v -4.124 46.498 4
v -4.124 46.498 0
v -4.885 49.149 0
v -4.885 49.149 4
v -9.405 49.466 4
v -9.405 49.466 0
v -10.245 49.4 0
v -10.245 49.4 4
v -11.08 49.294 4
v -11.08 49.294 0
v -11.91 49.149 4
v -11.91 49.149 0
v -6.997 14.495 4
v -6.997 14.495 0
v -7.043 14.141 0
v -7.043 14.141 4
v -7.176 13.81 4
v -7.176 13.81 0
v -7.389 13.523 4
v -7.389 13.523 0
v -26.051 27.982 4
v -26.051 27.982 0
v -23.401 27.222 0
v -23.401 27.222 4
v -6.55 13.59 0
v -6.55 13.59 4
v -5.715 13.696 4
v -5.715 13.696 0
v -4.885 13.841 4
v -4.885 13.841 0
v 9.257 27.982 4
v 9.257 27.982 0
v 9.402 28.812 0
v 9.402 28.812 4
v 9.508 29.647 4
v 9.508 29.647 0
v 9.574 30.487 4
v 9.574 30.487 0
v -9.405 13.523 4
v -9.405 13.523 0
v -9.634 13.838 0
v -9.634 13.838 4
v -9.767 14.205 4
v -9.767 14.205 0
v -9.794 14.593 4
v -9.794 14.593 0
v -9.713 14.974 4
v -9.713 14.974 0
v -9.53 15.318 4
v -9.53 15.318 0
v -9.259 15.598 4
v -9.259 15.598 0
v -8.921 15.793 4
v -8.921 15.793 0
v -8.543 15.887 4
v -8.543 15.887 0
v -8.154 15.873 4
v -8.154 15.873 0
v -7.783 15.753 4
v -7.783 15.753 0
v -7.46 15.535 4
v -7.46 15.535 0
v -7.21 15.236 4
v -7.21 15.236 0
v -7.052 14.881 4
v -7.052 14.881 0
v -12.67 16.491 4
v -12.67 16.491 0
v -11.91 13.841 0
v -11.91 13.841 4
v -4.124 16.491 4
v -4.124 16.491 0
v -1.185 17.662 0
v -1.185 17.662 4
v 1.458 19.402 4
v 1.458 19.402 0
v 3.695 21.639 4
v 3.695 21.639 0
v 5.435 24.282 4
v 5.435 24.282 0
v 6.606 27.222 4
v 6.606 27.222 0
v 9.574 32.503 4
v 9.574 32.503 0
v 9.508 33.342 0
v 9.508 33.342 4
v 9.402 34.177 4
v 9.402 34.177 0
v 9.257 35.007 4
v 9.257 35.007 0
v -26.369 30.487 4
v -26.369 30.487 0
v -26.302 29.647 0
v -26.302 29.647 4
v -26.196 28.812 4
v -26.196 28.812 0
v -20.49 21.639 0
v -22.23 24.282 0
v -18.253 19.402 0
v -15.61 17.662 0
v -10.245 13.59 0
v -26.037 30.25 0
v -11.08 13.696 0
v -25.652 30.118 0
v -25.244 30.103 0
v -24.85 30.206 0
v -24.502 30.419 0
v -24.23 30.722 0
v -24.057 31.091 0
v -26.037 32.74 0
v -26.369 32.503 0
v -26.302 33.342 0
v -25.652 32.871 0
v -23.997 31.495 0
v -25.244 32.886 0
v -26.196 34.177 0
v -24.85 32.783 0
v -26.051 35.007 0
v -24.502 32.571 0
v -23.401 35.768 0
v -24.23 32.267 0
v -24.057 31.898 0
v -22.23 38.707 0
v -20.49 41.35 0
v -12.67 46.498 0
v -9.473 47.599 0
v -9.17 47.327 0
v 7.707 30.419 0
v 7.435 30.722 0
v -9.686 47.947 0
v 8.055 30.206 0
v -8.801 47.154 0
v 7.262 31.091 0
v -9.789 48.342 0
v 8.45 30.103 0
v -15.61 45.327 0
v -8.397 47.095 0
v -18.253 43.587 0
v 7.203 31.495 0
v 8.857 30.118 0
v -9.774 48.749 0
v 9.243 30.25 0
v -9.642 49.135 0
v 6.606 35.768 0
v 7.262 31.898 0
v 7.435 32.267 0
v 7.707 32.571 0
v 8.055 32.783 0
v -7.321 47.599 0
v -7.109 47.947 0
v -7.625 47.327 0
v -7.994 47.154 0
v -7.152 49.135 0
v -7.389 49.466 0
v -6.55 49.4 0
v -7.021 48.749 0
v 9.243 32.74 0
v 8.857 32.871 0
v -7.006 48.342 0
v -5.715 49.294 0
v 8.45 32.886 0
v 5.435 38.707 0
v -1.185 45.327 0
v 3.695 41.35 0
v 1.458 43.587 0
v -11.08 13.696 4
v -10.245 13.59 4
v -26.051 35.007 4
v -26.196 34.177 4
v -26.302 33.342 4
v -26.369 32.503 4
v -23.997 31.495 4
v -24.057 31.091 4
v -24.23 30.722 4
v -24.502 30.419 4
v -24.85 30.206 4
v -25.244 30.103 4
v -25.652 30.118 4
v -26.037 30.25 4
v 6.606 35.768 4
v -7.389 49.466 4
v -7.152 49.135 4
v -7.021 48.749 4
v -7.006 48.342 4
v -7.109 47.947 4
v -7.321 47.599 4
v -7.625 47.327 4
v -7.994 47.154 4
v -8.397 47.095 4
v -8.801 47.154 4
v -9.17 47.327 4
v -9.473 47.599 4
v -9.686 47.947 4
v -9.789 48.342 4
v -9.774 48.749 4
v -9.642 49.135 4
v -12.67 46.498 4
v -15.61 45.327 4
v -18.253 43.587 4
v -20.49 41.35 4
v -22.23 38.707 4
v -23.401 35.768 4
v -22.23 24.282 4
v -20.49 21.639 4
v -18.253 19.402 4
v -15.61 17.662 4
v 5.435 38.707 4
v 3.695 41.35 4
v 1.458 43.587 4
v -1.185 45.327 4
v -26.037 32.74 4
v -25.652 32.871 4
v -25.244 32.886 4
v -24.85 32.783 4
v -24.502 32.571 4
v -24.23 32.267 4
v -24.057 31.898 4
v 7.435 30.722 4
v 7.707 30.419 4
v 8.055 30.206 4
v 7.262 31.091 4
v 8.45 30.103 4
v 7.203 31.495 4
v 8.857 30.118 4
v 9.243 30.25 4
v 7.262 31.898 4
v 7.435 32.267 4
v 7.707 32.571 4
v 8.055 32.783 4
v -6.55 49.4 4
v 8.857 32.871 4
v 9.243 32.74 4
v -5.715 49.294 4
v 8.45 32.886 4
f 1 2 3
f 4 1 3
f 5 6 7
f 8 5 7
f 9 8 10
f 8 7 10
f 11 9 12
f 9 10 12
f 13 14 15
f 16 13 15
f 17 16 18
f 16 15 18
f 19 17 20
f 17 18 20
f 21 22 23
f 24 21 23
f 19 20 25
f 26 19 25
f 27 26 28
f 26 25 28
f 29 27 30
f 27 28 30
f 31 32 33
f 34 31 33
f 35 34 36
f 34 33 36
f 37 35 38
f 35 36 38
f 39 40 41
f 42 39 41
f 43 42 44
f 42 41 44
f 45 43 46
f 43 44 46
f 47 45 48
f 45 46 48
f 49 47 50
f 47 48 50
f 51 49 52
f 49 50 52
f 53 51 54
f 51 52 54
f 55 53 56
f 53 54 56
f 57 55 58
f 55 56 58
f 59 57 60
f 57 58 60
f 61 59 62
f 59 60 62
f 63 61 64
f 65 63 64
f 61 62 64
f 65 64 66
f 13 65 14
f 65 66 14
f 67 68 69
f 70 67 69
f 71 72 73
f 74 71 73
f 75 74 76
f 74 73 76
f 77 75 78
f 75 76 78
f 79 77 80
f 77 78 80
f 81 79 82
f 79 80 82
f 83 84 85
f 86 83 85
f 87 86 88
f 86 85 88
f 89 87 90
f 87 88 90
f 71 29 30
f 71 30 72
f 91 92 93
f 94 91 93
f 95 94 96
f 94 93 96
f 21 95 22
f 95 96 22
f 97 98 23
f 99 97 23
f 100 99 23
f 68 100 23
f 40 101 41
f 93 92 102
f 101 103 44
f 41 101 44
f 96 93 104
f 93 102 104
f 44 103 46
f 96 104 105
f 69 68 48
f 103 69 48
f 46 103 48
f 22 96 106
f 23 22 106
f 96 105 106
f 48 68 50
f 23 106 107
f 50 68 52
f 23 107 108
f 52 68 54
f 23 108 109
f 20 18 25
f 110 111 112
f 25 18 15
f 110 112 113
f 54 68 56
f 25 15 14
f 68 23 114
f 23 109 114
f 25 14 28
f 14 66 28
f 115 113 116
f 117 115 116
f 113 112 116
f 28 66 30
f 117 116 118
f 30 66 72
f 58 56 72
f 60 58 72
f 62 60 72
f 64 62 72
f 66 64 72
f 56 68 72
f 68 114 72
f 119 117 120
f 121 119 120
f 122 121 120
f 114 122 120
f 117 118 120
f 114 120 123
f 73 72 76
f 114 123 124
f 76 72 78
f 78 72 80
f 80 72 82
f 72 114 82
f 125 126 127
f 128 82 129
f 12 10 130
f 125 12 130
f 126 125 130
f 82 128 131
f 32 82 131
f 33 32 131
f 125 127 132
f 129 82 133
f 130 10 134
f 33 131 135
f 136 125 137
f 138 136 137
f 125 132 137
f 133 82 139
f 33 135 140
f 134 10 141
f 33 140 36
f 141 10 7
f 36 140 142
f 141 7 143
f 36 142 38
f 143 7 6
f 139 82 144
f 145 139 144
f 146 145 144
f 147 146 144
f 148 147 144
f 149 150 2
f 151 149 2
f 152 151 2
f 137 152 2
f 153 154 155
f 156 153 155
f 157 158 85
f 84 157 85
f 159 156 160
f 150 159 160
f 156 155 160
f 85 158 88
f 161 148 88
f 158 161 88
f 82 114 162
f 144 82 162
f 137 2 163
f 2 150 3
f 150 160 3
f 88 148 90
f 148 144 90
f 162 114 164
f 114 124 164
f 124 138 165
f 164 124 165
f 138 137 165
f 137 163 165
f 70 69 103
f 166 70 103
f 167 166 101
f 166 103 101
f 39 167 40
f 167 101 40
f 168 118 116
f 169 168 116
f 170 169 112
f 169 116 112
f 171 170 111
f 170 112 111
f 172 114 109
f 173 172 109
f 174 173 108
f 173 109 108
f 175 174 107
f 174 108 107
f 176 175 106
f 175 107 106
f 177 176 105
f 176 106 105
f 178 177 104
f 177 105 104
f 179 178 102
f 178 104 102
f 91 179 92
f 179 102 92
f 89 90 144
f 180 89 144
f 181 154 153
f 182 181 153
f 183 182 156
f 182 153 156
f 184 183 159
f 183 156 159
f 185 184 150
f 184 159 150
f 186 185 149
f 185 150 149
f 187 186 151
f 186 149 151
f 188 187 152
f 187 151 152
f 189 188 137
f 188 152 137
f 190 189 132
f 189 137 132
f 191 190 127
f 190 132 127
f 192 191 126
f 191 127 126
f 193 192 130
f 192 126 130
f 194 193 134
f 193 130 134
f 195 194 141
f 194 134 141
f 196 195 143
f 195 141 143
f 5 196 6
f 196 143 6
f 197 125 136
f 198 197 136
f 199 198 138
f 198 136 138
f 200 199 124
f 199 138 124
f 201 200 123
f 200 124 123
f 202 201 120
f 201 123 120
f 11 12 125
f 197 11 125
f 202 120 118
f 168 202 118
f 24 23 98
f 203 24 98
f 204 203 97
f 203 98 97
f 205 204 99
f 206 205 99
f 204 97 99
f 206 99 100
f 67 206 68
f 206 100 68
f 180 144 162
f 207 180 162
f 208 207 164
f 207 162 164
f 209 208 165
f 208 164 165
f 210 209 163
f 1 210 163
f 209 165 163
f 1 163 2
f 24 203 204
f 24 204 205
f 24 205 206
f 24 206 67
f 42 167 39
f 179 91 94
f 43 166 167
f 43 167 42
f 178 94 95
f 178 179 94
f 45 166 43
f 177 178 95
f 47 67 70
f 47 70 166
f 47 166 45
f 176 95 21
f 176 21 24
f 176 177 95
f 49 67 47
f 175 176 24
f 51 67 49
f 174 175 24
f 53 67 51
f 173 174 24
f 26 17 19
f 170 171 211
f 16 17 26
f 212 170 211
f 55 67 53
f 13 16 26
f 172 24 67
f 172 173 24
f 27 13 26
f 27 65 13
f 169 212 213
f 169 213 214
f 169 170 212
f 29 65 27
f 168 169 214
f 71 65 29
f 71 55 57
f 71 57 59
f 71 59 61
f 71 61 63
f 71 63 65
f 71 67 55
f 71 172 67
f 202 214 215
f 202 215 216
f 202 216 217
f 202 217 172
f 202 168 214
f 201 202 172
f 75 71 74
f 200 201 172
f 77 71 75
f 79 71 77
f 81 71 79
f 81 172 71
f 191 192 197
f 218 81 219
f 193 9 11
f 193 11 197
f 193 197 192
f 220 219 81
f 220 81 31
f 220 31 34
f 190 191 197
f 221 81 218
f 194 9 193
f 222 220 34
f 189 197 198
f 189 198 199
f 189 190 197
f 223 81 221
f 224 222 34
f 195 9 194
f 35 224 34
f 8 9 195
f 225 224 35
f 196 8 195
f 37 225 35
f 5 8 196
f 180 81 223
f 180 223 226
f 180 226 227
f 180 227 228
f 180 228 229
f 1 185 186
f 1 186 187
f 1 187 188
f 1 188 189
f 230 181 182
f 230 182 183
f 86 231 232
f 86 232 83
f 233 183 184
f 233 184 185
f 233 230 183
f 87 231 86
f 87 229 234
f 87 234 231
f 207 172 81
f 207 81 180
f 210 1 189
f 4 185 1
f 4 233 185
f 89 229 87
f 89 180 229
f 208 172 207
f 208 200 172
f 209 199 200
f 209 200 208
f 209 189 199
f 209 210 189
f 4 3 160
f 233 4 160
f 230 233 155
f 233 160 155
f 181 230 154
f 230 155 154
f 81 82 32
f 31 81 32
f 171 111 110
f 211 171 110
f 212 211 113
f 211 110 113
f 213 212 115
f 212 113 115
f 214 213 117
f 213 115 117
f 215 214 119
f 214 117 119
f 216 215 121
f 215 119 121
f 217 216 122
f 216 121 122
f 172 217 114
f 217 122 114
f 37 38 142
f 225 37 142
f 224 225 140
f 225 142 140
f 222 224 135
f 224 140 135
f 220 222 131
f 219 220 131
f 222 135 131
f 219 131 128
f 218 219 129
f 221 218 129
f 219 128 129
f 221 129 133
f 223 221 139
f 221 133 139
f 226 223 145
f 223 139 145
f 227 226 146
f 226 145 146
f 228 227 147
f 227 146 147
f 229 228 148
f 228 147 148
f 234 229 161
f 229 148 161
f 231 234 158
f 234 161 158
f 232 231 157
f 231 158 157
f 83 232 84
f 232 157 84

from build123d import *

# Parameters (mm, degrees)
BOSS_EXTRUDE1_DEPTH = 4


with BuildPart() as part:
    # Sketch1 → Boss-Extrude1 (new body)
    with BuildSketch(Plane.XY):
        with BuildLine():
            ThreePointArc((-9.405096609, 49.466499285), (-10.662900345, 49.351582329), (-11.909548916, 49.148743758))
            Line((-11.909548916, 49.148743758), (-12.670152398, 46.498155867))
            ThreePointArc((-12.670152398, 46.498155867), (-19.428156186, 42.525600365), (-23.400711687, 35.767596578))
            Line((-23.400711687, 35.767596578), (-26.051299579, 35.006993096))
            ThreePointArc((-26.051299579, 35.006993096), (-26.25413815, 33.760344525), (-26.369055105, 32.502540789))
            ThreePointArc((-26.369055105, 32.502540789), (-24.849782677, 32.78323576), (-23.997290399, 31.494734579))
            ThreePointArc((-23.997290399, 31.494734579), (-24.849782677, 30.206233398), (-26.369055105, 30.486928369))
            ThreePointArc((-26.369055105, 30.486928369), (-26.25413815, 29.229124633), (-26.051299579, 27.982476062))
            Line((-26.051299579, 27.982476062), (-23.400711687, 27.22187258))
            ThreePointArc((-23.400711687, 27.22187258), (-19.428156186, 20.463868792), (-12.670152398, 16.491313291))
            Line((-12.670152398, 16.491313291), (-11.909548916, 13.840725399))
            ThreePointArc((-11.909548916, 13.840725399), (-10.662900345, 13.637886829), (-9.405096609, 13.522969873))
            ThreePointArc((-9.405096609, 13.522969873), (-8.921251899, 15.792988925), (-6.997290399, 14.494734579))
            ThreePointArc((-6.997290399, 14.494734579), (-7.099036053, 13.970773079), (-7.38948419, 13.522969873))
            ThreePointArc((-7.38948419, 13.522969873), (-6.131680454, 13.637886829), (-4.885031883, 13.840725399))
            Line((-4.885031883, 13.840725399), (-4.124428401, 16.491313291))
            ThreePointArc((-4.124428401, 16.491313291), (2.633575387, 20.463868792), (6.606130888, 27.22187258))
            Line((6.606130888, 27.22187258), (9.25671878, 27.982476062))
            ThreePointArc((9.25671878, 27.982476062), (9.459557351, 29.229124633), (9.574474306, 30.486928369))
            ThreePointArc((9.574474306, 30.486928369), (7.202709601, 31.494734579), (9.574474306, 32.502540789))
            ThreePointArc((9.574474306, 32.502540789), (9.459557351, 33.760344525), (9.25671878, 35.006993096))
            Line((9.25671878, 35.006993096), (6.606130888, 35.767596578))
            ThreePointArc((6.606130888, 35.767596578), (2.633575387, 42.525600365), (-4.124428401, 46.498155867))
            Line((-4.124428401, 46.498155867), (-4.885031883, 49.148743758))
            ThreePointArc((-4.885031883, 49.148743758), (-6.131680454, 49.351582329), (-7.38948419, 49.466499285))
            ThreePointArc((-7.38948419, 49.466499285), (-8.397290399, 47.094734579), (-9.405096609, 49.466499285))
        make_face()
    extrude(amount=BOSS_EXTRUDE1_DEPTH)


solid = part.part
